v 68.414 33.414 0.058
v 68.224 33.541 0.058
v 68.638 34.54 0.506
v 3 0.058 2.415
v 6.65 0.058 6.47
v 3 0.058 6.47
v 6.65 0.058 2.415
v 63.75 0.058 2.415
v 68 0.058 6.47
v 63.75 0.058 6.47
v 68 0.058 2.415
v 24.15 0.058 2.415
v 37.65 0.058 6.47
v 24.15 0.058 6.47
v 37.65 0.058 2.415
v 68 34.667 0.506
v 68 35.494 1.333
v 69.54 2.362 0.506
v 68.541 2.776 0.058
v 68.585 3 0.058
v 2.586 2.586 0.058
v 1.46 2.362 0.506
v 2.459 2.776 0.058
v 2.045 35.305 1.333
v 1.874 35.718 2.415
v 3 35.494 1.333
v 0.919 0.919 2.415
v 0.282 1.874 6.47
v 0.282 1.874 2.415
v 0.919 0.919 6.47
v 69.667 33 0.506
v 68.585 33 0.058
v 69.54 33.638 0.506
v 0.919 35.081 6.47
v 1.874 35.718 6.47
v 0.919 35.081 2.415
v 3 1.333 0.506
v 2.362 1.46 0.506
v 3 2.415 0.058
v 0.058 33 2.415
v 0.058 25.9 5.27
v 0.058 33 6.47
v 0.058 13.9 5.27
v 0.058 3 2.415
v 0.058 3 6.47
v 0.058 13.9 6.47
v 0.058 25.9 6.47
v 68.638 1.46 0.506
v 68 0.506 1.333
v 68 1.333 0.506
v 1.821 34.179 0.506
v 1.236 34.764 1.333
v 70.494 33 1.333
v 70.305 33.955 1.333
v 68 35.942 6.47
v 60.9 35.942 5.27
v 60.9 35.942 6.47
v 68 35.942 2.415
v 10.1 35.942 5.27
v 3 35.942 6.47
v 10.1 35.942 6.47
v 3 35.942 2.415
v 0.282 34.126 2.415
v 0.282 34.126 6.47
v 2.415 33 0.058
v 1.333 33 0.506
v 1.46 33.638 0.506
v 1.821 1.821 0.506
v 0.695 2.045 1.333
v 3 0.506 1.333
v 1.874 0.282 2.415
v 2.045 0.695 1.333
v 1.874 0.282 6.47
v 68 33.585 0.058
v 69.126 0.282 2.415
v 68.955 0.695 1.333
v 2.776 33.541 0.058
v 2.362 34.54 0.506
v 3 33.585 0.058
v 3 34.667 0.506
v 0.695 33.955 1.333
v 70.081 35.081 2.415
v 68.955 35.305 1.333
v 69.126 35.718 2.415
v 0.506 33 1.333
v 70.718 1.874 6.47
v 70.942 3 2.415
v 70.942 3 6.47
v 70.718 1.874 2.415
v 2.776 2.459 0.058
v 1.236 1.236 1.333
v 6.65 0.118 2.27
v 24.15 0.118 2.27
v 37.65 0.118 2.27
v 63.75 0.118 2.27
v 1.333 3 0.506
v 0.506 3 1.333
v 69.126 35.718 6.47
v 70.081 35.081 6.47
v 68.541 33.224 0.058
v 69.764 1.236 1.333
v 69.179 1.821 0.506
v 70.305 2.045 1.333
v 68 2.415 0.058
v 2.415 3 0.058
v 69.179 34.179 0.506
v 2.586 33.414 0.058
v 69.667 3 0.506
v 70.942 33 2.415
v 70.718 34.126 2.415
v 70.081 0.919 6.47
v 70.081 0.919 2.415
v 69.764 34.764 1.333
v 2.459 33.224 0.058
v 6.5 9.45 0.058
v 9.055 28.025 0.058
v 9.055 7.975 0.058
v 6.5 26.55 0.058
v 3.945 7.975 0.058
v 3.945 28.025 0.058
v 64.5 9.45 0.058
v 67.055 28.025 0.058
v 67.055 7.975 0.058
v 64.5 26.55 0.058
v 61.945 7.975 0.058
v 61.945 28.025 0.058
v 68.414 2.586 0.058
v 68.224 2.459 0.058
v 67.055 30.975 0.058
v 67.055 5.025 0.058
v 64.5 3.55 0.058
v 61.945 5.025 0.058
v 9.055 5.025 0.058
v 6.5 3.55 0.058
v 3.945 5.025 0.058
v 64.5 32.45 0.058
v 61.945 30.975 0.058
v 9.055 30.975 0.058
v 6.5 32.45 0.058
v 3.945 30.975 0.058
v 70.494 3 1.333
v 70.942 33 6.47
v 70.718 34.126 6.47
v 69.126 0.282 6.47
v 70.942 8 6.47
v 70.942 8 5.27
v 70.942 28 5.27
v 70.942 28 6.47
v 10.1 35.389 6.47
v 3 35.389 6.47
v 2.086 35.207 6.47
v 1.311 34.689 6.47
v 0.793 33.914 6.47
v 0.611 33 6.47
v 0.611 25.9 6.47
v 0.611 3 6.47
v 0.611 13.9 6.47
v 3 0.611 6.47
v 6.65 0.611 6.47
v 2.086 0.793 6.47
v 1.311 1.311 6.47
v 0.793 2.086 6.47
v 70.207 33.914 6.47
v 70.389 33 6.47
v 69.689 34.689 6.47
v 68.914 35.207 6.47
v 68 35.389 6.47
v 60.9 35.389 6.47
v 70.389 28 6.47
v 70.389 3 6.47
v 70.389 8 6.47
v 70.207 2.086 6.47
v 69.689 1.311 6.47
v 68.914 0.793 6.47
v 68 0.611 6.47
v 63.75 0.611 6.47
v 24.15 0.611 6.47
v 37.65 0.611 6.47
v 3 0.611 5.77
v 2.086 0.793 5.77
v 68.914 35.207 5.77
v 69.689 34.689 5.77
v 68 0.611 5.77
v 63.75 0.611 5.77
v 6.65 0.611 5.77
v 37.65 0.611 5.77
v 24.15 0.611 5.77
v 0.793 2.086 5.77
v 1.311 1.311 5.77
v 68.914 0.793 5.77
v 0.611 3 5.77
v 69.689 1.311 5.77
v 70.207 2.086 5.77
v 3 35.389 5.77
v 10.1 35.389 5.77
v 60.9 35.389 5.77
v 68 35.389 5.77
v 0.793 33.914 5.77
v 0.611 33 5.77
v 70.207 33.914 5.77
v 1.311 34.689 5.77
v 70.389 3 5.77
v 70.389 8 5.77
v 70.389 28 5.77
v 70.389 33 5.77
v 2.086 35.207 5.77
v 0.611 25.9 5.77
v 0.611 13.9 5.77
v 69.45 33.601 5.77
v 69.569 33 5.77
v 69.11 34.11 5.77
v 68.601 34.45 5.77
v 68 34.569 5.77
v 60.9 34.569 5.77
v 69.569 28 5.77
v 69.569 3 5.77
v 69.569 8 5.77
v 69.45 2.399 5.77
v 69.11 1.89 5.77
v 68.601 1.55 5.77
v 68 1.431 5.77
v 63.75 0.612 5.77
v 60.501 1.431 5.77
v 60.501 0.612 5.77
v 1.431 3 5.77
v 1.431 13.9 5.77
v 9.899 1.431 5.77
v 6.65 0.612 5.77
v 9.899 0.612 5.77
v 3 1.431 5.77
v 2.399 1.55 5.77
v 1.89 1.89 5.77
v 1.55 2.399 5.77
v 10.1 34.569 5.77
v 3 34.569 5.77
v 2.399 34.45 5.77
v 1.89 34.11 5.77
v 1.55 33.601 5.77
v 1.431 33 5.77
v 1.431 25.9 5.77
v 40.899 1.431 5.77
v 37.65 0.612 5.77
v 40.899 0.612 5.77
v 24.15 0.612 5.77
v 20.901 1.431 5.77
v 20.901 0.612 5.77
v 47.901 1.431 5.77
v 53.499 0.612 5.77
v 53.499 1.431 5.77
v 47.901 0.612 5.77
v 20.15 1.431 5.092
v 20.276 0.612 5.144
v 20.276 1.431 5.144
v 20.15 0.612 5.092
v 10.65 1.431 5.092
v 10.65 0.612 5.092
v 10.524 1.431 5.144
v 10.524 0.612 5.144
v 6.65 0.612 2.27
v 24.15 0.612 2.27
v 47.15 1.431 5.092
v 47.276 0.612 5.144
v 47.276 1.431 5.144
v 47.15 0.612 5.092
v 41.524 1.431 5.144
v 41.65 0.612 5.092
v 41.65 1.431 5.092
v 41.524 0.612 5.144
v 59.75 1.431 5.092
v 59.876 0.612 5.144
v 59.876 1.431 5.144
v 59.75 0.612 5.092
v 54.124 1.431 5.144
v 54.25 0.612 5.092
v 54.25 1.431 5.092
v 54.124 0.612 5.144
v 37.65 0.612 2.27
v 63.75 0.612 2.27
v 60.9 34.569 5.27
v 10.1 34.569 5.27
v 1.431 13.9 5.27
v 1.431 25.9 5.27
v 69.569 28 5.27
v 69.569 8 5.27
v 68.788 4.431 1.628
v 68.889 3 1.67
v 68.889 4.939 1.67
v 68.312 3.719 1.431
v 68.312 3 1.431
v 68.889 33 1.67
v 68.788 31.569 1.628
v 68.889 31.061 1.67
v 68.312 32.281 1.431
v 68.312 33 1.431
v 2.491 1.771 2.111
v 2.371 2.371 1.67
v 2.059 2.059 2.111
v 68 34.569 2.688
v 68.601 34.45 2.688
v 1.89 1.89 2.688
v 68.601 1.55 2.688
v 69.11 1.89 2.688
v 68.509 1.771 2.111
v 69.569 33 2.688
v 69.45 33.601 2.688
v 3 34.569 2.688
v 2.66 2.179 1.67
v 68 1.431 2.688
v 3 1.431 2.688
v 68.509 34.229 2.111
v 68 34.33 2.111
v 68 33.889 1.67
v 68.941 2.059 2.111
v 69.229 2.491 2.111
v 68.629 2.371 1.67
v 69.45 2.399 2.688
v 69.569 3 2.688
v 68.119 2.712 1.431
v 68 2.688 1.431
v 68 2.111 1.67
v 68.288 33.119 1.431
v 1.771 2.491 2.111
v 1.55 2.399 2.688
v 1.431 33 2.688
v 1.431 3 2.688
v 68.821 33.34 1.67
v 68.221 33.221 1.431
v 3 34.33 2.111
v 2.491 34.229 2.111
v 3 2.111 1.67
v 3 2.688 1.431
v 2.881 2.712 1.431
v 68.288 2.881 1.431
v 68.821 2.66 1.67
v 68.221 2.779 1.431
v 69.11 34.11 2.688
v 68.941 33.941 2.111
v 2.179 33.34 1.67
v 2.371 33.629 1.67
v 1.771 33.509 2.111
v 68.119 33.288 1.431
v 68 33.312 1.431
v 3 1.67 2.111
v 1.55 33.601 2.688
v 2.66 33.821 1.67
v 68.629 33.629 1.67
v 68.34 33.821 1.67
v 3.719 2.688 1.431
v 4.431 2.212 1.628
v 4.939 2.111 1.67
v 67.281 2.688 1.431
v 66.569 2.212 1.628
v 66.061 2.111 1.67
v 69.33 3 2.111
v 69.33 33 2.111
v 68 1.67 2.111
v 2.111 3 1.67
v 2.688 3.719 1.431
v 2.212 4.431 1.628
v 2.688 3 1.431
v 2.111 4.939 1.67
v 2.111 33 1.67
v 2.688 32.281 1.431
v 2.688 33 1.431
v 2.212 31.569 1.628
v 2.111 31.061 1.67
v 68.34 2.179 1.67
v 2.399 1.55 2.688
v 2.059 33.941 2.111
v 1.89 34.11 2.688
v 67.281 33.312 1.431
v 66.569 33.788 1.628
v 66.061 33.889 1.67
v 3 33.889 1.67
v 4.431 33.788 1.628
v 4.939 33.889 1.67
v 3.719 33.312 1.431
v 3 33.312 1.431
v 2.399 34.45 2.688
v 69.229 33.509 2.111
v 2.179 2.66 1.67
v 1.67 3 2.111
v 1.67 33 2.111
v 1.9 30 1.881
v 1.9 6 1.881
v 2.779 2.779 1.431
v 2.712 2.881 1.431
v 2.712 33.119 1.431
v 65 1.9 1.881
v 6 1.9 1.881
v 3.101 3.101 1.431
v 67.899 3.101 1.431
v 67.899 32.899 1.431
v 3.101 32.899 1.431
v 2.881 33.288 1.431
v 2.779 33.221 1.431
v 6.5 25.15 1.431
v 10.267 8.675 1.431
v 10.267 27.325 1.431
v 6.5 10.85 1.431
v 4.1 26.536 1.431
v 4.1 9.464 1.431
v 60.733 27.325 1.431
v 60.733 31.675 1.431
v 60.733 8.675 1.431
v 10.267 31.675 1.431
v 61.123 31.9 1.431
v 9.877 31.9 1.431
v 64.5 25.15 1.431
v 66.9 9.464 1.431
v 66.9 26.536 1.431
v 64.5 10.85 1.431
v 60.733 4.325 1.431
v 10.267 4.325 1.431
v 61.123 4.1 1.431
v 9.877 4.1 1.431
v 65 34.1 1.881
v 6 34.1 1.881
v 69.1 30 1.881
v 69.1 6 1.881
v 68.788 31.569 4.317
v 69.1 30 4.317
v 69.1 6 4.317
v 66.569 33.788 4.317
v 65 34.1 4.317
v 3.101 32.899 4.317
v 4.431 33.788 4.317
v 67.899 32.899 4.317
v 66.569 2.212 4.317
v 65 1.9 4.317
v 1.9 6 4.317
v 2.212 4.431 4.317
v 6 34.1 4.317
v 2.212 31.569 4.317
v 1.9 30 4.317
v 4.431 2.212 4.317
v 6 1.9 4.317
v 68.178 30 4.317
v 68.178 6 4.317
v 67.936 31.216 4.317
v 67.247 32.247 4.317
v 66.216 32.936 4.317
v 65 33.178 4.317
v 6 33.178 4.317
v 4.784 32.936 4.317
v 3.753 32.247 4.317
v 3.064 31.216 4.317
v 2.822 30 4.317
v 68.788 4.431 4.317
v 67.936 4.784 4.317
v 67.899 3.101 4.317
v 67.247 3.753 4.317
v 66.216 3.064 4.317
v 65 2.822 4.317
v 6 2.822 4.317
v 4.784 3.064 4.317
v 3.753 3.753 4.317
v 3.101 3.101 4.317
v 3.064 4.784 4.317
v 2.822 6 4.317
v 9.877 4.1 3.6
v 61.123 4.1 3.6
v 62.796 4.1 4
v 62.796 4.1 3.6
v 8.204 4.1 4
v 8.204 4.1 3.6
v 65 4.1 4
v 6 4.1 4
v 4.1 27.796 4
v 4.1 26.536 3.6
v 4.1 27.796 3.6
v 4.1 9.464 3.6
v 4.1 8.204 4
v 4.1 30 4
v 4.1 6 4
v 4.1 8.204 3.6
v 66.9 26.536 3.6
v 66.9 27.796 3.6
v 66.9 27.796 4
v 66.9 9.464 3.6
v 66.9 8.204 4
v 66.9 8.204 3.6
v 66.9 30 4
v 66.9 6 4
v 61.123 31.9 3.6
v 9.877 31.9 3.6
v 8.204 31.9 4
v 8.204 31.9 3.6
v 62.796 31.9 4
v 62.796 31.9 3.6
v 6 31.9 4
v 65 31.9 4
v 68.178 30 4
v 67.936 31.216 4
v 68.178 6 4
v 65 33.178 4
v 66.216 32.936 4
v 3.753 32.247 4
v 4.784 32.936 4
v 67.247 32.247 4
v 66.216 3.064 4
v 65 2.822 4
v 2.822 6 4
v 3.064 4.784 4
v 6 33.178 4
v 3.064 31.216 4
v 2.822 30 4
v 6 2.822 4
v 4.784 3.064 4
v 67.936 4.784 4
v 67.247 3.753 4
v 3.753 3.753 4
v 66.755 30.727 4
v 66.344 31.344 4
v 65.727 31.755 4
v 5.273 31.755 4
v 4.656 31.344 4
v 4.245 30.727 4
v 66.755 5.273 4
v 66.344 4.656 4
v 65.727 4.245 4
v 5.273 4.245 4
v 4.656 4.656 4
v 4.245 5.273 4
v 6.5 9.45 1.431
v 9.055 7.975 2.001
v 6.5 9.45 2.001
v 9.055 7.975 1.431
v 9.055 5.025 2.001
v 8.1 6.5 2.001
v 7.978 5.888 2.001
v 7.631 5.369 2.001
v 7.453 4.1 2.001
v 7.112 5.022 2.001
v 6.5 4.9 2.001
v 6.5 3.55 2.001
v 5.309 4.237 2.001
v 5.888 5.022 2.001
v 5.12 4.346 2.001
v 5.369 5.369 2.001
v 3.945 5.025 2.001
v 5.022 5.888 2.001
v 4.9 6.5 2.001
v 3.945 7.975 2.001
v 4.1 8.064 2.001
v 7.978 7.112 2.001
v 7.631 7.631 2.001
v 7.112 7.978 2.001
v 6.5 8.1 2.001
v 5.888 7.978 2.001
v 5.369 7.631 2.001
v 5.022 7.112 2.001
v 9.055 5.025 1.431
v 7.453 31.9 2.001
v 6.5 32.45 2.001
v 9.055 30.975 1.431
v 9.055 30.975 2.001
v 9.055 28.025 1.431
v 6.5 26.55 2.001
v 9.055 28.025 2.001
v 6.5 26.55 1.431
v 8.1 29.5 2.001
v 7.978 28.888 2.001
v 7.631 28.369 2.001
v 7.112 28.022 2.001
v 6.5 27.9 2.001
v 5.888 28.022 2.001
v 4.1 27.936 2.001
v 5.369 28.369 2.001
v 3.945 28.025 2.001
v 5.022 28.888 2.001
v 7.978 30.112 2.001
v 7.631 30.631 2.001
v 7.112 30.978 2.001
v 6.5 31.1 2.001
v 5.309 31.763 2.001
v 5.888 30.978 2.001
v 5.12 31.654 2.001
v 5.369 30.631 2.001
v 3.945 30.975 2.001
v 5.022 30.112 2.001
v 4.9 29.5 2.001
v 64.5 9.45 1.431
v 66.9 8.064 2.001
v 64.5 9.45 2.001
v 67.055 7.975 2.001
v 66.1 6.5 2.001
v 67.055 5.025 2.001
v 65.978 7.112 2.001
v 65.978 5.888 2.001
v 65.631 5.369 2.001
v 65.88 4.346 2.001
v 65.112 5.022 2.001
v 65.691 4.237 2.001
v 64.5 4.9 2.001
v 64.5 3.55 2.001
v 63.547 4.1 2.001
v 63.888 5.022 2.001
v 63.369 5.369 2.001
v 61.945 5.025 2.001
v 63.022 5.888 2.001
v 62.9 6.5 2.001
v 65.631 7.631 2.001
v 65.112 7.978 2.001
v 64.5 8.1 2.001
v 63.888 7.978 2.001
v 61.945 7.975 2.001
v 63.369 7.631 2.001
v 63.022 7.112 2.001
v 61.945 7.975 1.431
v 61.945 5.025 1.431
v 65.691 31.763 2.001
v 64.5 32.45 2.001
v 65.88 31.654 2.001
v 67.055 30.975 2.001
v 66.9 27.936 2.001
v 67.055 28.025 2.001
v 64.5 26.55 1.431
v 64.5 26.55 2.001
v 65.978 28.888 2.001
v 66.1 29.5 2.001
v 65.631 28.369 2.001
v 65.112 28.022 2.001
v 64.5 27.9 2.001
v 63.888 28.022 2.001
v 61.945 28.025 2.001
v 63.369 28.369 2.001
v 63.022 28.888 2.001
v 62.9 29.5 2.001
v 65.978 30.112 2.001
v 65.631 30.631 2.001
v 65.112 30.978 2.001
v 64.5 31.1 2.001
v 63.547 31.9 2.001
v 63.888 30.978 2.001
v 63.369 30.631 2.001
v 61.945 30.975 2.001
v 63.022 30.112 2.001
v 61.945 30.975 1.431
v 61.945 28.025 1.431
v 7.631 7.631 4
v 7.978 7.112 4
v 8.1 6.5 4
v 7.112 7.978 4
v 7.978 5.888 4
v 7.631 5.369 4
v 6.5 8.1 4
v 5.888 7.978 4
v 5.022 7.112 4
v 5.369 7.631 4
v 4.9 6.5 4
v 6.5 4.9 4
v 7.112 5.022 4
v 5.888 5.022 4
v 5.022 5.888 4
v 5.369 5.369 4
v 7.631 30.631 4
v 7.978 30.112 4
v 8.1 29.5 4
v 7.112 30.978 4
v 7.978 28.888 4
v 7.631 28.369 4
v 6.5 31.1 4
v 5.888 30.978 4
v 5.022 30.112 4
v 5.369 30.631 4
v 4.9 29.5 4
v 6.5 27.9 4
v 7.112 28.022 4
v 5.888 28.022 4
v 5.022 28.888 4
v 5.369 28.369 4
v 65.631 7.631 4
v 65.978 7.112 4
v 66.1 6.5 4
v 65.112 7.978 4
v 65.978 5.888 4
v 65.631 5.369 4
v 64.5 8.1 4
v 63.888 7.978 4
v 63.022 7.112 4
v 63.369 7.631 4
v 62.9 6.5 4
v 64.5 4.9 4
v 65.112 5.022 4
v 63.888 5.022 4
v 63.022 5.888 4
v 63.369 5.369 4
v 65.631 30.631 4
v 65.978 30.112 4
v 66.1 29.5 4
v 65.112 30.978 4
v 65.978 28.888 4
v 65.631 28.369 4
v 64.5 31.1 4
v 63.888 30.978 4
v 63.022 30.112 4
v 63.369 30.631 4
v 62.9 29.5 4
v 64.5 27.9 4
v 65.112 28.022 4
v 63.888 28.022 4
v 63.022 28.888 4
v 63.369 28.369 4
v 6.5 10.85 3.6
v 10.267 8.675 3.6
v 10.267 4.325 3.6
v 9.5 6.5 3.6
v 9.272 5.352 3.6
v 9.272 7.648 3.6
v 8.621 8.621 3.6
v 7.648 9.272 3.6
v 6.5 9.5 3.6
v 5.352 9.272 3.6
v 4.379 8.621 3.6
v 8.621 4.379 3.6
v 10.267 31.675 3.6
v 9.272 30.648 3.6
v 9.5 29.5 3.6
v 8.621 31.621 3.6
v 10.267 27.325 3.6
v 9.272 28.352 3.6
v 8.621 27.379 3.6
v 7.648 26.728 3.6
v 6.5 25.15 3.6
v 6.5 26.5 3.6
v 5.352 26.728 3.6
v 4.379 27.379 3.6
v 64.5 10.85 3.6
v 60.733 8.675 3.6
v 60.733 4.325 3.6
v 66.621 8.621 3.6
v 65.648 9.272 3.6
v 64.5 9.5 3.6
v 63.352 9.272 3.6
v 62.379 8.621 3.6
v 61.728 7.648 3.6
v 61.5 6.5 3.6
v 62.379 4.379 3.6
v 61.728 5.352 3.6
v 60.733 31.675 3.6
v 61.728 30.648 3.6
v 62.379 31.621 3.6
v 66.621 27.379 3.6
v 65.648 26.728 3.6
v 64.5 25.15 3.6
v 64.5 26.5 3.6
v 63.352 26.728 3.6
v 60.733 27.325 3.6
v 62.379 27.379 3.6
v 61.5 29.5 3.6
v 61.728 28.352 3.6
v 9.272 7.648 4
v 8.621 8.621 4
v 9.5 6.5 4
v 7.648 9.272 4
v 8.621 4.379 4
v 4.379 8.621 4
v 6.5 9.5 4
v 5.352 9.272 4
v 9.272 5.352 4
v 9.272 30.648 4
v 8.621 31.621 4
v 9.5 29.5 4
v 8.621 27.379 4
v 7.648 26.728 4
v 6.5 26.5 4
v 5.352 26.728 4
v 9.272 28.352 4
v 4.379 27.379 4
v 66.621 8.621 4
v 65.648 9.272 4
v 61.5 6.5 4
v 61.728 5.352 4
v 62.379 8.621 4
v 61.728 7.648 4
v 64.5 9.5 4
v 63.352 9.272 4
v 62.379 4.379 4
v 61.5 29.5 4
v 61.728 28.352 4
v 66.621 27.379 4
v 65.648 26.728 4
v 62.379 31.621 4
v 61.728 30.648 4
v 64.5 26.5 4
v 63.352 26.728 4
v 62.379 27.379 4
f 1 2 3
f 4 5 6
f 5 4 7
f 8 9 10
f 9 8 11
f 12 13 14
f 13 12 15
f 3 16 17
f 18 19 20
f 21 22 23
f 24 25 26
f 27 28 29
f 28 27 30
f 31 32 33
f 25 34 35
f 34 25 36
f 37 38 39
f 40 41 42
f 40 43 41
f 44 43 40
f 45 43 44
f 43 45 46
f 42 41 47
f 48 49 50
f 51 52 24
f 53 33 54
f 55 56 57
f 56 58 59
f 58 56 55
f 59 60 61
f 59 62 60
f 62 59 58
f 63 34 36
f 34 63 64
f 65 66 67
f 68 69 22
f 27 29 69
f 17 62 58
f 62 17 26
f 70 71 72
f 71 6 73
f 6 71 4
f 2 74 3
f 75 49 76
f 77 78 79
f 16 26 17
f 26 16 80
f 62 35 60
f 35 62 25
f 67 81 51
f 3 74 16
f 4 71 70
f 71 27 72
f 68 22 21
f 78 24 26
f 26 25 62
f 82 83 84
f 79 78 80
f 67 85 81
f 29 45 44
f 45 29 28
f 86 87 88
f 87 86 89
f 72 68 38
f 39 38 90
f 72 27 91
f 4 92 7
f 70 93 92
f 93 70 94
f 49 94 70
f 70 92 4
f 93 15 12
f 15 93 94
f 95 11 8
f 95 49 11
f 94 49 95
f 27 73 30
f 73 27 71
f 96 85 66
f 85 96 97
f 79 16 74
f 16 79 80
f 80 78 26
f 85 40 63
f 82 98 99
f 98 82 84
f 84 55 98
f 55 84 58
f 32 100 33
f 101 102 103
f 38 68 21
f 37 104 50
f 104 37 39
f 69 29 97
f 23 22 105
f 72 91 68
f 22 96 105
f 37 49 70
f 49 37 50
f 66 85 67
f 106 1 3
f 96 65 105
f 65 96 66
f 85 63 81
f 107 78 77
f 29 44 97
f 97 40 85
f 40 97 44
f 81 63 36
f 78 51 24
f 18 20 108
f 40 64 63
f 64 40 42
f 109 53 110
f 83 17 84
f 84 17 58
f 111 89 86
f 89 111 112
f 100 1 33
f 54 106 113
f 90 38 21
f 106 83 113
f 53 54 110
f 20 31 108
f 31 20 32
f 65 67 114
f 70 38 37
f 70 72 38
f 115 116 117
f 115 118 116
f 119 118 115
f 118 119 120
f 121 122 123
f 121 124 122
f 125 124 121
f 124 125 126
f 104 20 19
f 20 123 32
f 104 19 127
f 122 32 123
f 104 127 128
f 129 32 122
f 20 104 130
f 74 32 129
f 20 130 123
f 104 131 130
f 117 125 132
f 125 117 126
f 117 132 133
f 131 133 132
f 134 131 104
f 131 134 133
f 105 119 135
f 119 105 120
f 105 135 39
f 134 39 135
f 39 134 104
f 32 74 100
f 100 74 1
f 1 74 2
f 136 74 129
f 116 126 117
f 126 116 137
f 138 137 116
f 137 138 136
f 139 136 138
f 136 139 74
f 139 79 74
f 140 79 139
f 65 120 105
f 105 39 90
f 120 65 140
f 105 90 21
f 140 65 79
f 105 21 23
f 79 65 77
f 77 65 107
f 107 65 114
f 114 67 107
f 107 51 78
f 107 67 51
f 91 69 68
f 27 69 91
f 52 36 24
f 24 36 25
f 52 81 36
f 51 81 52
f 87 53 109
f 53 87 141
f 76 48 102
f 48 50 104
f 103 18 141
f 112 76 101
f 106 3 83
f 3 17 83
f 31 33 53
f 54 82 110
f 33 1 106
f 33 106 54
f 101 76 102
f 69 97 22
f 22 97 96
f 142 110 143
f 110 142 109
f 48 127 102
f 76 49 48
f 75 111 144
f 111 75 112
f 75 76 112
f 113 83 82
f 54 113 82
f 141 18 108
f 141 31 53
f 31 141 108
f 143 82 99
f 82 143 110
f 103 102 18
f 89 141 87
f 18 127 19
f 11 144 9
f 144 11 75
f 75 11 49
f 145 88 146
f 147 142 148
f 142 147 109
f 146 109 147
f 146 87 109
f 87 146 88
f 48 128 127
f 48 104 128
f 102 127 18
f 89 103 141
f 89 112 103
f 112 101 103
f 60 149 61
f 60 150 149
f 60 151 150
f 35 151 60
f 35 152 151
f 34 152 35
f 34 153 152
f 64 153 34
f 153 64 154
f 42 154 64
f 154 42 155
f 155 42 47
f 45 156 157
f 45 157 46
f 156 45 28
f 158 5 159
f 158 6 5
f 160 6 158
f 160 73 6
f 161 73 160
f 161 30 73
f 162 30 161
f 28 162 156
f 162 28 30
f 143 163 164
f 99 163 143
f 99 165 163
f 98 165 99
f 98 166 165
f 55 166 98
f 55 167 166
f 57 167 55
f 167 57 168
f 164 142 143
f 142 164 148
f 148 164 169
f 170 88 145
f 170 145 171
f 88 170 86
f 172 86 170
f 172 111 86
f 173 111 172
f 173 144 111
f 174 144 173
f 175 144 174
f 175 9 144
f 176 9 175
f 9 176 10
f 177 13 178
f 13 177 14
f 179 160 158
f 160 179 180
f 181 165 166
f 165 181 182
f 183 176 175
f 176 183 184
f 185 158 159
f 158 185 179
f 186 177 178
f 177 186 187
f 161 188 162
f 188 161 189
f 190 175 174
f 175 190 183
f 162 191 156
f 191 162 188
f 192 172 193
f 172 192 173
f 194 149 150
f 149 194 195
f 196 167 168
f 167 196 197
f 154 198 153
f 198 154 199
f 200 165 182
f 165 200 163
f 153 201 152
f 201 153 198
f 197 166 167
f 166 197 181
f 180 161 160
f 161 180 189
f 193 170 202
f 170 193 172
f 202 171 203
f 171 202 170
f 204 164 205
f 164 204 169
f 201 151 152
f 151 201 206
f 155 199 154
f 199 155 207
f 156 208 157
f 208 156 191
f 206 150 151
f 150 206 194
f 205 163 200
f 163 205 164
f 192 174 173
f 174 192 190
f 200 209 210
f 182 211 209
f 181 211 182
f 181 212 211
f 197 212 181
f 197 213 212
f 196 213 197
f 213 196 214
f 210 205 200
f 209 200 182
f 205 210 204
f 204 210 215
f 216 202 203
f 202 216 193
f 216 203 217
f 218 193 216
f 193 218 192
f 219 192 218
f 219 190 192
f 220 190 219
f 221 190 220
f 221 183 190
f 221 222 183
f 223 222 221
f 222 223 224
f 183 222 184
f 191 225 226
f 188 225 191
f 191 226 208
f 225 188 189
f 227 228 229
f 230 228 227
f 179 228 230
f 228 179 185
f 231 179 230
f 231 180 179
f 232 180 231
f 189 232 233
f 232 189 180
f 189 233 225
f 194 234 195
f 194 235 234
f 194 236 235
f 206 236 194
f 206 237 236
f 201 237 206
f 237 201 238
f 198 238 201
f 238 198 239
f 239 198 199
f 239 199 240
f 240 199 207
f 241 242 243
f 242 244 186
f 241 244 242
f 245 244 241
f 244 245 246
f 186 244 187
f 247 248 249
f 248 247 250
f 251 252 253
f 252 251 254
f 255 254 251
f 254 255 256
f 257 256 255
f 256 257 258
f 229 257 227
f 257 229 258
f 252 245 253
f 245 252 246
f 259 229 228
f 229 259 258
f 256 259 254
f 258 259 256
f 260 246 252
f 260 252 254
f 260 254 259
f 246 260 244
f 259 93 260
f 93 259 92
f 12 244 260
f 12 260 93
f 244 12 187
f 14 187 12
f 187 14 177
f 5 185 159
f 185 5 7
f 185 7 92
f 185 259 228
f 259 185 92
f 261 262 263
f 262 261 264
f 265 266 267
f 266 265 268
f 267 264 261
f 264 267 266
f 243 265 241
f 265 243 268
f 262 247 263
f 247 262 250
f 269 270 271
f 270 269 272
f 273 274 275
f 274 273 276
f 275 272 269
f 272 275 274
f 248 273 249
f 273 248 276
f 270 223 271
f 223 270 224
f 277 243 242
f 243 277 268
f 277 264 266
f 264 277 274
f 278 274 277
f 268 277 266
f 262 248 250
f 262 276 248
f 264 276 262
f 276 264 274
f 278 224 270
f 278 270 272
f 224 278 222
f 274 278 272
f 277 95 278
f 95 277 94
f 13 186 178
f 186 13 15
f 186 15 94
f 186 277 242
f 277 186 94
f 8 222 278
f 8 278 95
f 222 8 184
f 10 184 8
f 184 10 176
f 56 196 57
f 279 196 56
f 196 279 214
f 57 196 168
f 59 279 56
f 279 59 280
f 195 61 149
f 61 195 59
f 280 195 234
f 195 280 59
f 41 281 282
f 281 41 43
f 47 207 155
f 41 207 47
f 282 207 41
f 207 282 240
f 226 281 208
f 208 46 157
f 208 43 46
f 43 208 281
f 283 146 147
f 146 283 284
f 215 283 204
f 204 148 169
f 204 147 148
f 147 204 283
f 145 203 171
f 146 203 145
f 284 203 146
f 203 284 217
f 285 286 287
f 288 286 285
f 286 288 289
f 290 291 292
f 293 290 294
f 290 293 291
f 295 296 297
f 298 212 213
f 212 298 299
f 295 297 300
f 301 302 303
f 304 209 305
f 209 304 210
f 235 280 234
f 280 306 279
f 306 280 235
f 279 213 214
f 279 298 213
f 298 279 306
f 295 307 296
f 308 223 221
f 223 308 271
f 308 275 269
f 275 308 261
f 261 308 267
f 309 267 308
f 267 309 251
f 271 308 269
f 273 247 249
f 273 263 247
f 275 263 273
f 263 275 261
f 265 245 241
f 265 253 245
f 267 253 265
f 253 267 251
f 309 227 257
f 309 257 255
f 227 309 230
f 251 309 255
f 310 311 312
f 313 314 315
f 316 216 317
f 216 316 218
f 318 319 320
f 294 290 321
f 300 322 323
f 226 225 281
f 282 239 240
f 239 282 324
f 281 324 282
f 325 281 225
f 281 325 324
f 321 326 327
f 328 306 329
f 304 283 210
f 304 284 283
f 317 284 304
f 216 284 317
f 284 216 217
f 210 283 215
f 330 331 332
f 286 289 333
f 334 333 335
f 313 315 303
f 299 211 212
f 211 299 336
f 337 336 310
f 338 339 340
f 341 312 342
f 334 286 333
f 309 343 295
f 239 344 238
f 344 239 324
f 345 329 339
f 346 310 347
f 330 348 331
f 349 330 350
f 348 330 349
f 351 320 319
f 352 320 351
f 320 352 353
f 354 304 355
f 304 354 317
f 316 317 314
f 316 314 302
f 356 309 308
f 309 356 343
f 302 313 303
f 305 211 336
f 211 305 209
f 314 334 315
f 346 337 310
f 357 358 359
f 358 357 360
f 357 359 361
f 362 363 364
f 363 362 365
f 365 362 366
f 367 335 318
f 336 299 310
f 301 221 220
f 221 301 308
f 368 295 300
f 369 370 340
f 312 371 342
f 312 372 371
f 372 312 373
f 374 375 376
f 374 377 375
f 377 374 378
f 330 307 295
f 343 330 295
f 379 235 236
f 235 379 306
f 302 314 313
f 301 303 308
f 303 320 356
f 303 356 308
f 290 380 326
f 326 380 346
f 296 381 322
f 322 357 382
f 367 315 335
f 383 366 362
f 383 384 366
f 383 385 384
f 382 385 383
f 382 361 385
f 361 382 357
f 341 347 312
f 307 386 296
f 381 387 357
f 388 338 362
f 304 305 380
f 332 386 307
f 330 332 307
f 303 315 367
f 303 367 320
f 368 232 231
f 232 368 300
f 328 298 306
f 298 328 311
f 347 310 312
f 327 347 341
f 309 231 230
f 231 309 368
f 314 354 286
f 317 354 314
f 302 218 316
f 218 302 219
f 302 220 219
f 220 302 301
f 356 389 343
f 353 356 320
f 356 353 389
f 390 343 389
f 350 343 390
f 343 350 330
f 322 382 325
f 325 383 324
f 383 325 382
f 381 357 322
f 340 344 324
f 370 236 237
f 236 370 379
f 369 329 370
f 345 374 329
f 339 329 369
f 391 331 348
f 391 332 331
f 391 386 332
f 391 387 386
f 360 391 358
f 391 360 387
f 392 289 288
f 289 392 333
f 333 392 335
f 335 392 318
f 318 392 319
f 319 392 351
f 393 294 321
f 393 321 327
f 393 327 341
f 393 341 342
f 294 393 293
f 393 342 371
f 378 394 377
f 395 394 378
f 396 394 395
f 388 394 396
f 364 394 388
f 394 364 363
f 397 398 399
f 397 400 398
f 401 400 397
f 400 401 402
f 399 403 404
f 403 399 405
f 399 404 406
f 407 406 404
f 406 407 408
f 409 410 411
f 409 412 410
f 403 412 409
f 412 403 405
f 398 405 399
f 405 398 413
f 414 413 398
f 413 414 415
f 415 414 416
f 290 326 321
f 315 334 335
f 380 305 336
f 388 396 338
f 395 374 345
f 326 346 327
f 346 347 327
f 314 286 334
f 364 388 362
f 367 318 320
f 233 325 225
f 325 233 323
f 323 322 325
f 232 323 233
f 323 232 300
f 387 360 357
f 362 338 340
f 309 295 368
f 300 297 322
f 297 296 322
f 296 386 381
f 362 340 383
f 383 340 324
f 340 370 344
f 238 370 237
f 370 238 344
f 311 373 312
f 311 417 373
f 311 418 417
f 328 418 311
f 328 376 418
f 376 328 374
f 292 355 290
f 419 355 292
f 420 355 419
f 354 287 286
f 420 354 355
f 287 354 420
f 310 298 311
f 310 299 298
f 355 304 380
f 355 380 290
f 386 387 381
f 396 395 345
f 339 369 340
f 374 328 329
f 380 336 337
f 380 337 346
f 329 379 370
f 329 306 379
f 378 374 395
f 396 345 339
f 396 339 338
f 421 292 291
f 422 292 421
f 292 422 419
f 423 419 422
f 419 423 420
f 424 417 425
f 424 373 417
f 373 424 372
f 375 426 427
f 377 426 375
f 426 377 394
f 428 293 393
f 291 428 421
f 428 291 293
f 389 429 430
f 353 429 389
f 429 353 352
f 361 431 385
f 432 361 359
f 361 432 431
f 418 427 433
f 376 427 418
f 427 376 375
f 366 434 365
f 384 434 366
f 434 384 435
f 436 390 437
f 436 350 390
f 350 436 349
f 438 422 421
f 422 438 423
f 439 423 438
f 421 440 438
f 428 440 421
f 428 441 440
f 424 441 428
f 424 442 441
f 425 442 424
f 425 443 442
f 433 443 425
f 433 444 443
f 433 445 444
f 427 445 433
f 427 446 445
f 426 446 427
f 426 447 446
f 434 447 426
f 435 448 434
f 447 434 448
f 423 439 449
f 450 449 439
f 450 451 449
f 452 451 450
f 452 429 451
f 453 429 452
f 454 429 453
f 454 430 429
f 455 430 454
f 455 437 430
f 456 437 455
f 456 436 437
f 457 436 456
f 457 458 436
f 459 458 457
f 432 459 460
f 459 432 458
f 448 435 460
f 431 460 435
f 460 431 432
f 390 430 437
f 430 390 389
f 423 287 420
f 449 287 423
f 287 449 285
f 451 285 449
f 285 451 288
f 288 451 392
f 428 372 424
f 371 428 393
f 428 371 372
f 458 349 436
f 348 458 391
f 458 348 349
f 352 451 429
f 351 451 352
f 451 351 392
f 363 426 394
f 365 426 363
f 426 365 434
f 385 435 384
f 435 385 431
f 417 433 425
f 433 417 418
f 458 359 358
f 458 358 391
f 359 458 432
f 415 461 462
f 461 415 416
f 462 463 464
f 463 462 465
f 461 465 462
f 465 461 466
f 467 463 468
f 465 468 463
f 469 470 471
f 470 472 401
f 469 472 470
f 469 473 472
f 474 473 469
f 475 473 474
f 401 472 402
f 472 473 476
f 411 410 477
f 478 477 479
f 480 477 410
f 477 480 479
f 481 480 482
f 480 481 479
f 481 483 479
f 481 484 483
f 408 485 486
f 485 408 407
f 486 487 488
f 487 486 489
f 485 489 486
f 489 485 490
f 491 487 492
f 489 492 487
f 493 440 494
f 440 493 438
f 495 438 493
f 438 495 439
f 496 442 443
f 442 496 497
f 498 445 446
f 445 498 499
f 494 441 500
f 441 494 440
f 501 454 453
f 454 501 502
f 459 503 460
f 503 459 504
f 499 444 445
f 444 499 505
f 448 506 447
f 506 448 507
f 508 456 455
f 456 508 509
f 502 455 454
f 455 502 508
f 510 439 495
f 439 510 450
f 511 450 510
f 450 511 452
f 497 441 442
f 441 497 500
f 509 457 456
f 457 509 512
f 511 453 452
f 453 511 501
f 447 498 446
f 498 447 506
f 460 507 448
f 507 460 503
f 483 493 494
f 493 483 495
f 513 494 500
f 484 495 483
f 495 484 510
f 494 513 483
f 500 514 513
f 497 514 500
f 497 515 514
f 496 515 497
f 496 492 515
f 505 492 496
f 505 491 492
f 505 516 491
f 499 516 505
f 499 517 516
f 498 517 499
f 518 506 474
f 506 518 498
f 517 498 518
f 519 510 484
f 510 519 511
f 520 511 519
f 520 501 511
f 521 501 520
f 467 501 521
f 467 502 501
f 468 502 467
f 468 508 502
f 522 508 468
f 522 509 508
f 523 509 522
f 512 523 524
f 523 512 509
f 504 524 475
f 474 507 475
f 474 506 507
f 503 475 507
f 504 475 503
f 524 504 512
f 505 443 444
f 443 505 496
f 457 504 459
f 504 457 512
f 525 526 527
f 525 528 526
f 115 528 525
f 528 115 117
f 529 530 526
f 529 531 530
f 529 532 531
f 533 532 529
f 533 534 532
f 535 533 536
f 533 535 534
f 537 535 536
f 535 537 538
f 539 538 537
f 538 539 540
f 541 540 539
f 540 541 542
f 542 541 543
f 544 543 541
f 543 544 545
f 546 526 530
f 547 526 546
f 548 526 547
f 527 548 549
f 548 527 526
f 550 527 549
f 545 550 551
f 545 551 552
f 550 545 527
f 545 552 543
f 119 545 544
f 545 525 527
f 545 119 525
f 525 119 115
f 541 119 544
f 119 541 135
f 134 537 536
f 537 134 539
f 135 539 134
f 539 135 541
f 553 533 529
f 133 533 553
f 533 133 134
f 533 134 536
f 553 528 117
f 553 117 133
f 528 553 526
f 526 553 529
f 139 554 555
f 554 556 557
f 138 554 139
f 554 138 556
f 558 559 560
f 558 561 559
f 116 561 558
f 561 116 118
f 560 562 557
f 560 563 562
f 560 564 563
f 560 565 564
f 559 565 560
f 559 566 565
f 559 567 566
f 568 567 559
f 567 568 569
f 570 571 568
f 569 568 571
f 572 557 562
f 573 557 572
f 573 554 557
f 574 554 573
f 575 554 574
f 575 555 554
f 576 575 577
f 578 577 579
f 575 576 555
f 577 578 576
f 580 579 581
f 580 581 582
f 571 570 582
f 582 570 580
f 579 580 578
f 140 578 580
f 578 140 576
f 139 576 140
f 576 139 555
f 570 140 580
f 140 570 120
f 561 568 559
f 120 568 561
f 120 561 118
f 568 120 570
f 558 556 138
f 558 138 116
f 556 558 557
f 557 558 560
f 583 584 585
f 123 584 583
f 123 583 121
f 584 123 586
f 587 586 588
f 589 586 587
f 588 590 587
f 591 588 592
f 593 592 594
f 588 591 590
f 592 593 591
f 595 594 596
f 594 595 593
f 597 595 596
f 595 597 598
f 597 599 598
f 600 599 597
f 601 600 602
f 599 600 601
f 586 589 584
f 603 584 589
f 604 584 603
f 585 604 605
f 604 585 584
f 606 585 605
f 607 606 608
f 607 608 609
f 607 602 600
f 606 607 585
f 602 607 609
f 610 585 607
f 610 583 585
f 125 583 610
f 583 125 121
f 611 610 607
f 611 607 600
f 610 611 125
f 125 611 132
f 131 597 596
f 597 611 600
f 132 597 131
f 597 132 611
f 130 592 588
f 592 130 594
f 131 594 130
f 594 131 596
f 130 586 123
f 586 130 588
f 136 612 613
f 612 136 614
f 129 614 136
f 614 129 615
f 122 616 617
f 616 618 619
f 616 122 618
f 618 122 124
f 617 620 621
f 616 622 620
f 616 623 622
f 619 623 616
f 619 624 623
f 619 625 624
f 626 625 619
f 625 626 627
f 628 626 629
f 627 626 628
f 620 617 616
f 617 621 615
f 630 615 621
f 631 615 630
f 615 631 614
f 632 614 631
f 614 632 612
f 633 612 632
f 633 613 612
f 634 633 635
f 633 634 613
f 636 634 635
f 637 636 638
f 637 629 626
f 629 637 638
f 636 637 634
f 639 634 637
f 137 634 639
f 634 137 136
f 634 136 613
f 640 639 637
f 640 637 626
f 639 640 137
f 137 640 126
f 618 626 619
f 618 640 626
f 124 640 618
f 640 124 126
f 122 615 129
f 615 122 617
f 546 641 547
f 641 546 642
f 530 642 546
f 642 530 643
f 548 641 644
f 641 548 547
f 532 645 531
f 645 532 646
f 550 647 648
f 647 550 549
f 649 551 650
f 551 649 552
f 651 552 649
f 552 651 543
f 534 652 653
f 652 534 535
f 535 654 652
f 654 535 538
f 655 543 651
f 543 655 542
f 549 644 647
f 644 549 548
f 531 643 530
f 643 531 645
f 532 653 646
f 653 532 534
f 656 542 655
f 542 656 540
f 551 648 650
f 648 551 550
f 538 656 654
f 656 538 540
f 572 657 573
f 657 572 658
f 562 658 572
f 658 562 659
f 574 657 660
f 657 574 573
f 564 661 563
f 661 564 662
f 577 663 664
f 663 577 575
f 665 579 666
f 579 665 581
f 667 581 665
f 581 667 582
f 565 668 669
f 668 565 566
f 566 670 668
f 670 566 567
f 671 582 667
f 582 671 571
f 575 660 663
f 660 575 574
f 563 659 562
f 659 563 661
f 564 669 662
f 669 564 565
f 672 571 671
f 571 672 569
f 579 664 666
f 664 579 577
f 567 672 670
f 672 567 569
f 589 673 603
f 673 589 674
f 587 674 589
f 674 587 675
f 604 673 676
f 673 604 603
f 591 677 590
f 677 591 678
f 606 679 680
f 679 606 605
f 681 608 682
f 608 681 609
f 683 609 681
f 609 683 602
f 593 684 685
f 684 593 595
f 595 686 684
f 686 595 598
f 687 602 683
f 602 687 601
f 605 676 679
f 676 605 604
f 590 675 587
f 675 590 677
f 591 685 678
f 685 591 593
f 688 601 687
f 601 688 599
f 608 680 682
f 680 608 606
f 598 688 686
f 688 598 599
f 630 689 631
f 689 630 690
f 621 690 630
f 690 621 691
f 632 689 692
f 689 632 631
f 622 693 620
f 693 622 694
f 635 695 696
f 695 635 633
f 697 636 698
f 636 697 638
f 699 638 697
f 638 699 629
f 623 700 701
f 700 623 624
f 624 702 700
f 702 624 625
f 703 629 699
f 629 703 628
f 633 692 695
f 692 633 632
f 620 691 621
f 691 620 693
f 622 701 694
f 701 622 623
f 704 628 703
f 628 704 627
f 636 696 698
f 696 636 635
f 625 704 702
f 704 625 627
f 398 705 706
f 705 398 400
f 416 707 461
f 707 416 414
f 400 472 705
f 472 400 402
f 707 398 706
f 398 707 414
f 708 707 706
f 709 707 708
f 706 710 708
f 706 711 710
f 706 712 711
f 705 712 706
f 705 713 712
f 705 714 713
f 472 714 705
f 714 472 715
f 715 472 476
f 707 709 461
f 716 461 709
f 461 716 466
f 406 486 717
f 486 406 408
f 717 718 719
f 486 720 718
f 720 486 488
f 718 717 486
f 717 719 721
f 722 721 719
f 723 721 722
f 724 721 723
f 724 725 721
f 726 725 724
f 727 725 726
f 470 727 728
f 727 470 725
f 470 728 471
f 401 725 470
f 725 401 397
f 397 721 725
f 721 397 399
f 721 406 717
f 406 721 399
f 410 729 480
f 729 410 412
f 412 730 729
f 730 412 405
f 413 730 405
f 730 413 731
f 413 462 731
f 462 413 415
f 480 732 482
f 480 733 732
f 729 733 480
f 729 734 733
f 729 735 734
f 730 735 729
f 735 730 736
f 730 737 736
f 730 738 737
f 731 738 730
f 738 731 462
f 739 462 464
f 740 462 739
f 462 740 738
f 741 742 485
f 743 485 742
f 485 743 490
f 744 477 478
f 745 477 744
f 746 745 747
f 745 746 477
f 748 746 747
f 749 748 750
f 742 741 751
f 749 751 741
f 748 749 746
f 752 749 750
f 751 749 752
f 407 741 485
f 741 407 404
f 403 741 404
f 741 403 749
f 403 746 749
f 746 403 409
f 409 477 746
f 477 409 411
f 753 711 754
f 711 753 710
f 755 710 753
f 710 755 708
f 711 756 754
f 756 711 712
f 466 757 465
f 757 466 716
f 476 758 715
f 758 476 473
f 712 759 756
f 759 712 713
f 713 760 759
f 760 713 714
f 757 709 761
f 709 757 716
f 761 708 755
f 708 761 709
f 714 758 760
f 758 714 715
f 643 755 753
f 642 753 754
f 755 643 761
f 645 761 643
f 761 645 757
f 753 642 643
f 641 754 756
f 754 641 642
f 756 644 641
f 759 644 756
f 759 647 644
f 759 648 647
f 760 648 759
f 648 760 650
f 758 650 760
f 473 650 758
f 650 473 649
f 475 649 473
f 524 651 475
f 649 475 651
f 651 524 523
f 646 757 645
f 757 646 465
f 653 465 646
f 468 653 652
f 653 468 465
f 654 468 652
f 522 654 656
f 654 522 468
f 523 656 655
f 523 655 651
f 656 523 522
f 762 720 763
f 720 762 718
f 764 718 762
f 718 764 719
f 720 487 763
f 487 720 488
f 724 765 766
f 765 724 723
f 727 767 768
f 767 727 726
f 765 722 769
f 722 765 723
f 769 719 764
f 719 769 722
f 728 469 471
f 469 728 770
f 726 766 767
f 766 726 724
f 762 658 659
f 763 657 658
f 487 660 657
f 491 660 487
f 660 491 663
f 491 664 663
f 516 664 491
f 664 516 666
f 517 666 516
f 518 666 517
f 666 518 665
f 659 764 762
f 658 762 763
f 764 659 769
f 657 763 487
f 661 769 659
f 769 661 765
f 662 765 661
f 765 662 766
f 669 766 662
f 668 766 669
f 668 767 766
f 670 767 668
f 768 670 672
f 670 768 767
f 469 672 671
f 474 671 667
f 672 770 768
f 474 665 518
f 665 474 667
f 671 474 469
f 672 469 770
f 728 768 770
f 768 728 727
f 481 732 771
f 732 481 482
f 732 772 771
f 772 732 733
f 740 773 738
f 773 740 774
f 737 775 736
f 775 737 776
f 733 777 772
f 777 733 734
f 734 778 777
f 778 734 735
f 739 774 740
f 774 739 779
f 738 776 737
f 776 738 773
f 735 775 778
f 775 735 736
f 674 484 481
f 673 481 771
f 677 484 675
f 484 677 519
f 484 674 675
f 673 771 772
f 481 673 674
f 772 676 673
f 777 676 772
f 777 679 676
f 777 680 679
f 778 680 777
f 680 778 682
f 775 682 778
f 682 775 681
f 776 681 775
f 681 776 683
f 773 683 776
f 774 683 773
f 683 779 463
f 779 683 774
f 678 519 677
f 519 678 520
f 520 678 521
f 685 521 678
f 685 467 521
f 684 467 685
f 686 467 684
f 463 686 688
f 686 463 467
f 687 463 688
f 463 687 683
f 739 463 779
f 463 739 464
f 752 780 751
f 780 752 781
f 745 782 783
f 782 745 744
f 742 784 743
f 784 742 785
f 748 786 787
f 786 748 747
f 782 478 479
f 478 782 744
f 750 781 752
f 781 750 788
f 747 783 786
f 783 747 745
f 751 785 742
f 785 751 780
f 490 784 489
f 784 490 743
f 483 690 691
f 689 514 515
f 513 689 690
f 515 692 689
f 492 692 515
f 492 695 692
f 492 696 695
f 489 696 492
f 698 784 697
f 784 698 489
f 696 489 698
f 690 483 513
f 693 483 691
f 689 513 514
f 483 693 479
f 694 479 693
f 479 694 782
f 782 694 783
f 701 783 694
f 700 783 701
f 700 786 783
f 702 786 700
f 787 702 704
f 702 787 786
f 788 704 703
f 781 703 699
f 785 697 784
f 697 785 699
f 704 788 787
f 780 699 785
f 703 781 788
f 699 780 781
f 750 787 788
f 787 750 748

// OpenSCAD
inch=25.4;

boards=1;
standoff=0;

color=1;
spacing=1;

kerf=0.007*inch;

make_stl=0;

show_branding=0;

bevel=3;

corners=3;

low_fineness=16;
low_font_fineness=1;
low_disk_fineness=48;
stl_fineness=80;
stl_font_fineness=40;
stl_disk_fineness=320;

fineness=make_stl?stl_fineness:low_fineness;

font_fineness=make_stl?stl_font_fineness:low_font_fineness;

disk_fineness=make_stl?stl_disk_fineness:low_disk_fineness;

screw_length=10;
screw_head=2.2;

thickness=screw_length+screw_head;


shell_thickness=1.4;
nut_kerf=2.2;

board_bevel=3;
board_zpos=4;
board_thickness=1/20*inch;
support_thickness=2.2;
io_support_thickness=bevel-(shell_thickness-kerf)/2;

shell_connector=shell_thickness/2;
shell_split=board_zpos+board_thickness+0.5;

cladding_offset=3;
cladding_override=1;

if (make_stl){
    fineness=stl_fineness;
    font_fineness=stl_font_fineness;
}

module PiZero(){
    difference(){
        minkowski(){
            cylinder(board_thickness/2,board_bevel,board_bevel,$fn=fineness);
            translate([bevel+board_bevel,bevel+board_bevel,board_zpos])
                cube(size=[65-board_bevel*2,30-board_bevel*2,board_thickness/2]);
        }
        translate([bevel,bevel,0])
        ScrewHoles();
    }
}

module PiZeroKerf(){
    minkowski(){
        cylinder(board_thickness/2+kerf*2,board_bevel+kerf,board_bevel+kerf,$fn=fineness);
        translate([bevel+board_bevel,bevel+board_bevel,board_zpos])
            cube(size=[65-board_bevel*2,30-board_bevel*2,board_thickness/2]);
    }
}

// Screws

module ScrewHoles(){
    translate([3.5,3.5,0])
    Screw();
    
    translate([3.5,26.5,0])
    Screw();
    
    translate([61.5,3.5,0])
    Screw();
    
    translate([61.5,26.5,0])
    Screw();
}

module Screw(){
    translate([0,0,-0.002])
    cylinder(thickness+0.004,1.6,1.6,$fn=fineness);
}



// IO Cutouts

module GPIOCutout(){
    translate([bevel+32.5-(20*inch/10)/2,30+bevel,board_zpos+board_thickness])
    cube(size=[20*inch/10,bevel+1,2+0.001]);
}

module CameraIOCutout(){
    translate([65+bevel-65/2,bevel+(30-20)/2,board_zpos+board_thickness])
    cube(size=[bevel+1+65/2,20,1.5]);
}

module MicroSDCutout(){
    translate([bevel+14,12/2+bevel+16.9,board_zpos+board_thickness])
    rotate([0,0,180])
    cube([bevel+1+14,12,2.5]);
}

module MicroSDShellCutout(){
    h=thickness-(board_zpos+board_thickness)-2.5;
    
    translate([-22.5+bevel+1,16.9+bevel,board_zpos+board_thickness+2.5])
    translate([0,0,-0.001])
    intersection(){
        cylinder(h,22.5+shell_thickness,22.5+shell_thickness,$fn=disk_fineness);
            translate([22.5-((bevel+1+shell_thickness)/2)+shell_thickness,0,h/2])
            cube(size=[bevel+shell_thickness+1,12+shell_thickness*2,h],center=true);
    }
}

module MicroSDNailCutout(){
    h=thickness-(board_zpos+board_thickness);
    
    translate([-22.5+bevel+1,16.9+bevel,board_zpos+board_thickness])
    translate([0,0,-0.002])
    intersection(){
        cylinder(h+0.002,22.5,22.5,$fn=disk_fineness);
            translate([22.5-((bevel+1)/2)-0.001,0,h/2])
            cube(size=[bevel+1+0.001,12,h+0.004],center=true);
    }
}

module MicroSDTab(){
    
    translate([-22.5+bevel+1,16.9+bevel,board_zpos+board_thickness])
    
        translate([0,0,2.5])
        intersection(){
            cylinder(shell_thickness,22.5+shell_thickness,22.5+shell_thickness,$fn=disk_fineness);
            translate([22.5-((bevel+1+shell_thickness)/2)+shell_thickness,0,shell_thickness/2-0.001])
            cube(size=[bevel+shell_thickness+1,12+shell_thickness*2,shell_thickness+0.002],center=true);
        }
}

module HDMIPoly(){
    polygon([[1,0],[0,1],[0,3.5],[11.5,3.5],[11.5,1],[10.5,0]]);
}


module HDMICladdingPoly(){
    polygon([[0,0],[0,3.5],[11.5,3.5],[11.5,0]]);
}

module USBMicroPoly(){
    polygon([[1,0],[0,1],[0,3.0],[7.5,3.0],[7.5,1],[6.5,0]]);
}

module USBMicroCladdingPoly(){
    polygon([[0,0],[0,3.0],[7.5,3.0],[7.5,0]]);
}

module HDMIMiniCutout(){
    translate([bevel+12.4-(11.5/2),bevel,board_zpos+board_thickness])
    rotate([90,0,0])
 linear_extrude(bevel+1,convexity=10)
    offset(r=kerf)
    HDMIPoly();
}

module USBMicroCutout(){
      translate([bevel+41.4-(7.5/2),bevel,board_zpos+board_thickness])
    rotate([90,0,0])
    linear_extrude(bevel+1,convexity=10)
    offset(r=kerf)
    USBMicroPoly();
}

module USBMicroCutoutB(){
      translate([bevel+54-(7.5/2),bevel,board_zpos+board_thickness])
    rotate([90,0,0])
    linear_extrude(bevel+1,convexity=10)
    offset(r=kerf)
    USBMicroPoly();
}

module HDMIMiniCladdingCutout(){
    translate([bevel+12.4,bevel-io_support_thickness+0.001,board_zpos+board_thickness-cladding_offset])
    rotate([90,0,0])
    linear_extrude(bevel+1,convexity=10)
    offset(delta=cladding_offset)
    translate([-11.5/2,3,0])
    HDMICladdingPoly();
}

module USBMicroCladdingCutoutA(){
    translate([bevel+41.4,bevel-io_support_thickness+0.001,board_zpos+board_thickness-cladding_offset])
    rotate([90,0,0])
    linear_extrude(bevel+1,convexity=10)
    offset(delta=cladding_offset)
    translate([-7.5/2,3,0])
    USBMicroCladdingPoly();
}

module USBMicroCladdingCutoutB(){
    translate([bevel+54,bevel-io_support_thickness+0.001,board_zpos+board_thickness-cladding_offset])
    rotate([90,0,0])
    linear_extrude(bevel+1,convexity=10)
    offset(delta=cladding_offset)
    translate([-7.5/2,3,0])
    USBMicroCladdingPoly();
}



// Screw Cutouts


module ScrewHead(){
    
    // Top Mounts
    translate([0,0,0.001])
    cylinder(nut_kerf+0.002,5.9/2,5.9/2,$fn=fineness);
}

module ScrewHeads(){
    
    // Bottom Screw Stands
    translate([3.5,3.5,thickness-nut_kerf])
    ScrewHead();
    
    translate([3.5,26.5,thickness-nut_kerf])
    ScrewHead();
    
    translate([61.5,3.5,thickness-nut_kerf])
    ScrewHead();
    
    translate([61.5,26.5,thickness-nut_kerf])
    ScrewHead();
}

module ScrewHeadStand(){
    
    translate([0,0,0])
    cylinder(nut_kerf+0.001,5.9/2+shell_thickness,5.9/2+shell_thickness,$fn=fineness);
}

module ScrewHeadStands(){
    translate([3.5,3.5,thickness-nut_kerf-shell_thickness])
    ScrewHeadStand();
    
    translate([3.5,26.5,thickness-nut_kerf-shell_thickness])
    ScrewHeadStand();
    
    translate([61.5,3.5,thickness-nut_kerf-shell_thickness])
    ScrewHeadStand();
    
    translate([61.5,26.5,thickness-nut_kerf-shell_thickness])
    ScrewHeadStand();
}

module TopScrewStand(){
    translate([0,0,board_zpos+board_thickness+kerf*2])
    cylinder(thickness-board_zpos-nut_kerf-shell_thickness-board_thickness-kerf,1.6+shell_thickness,1.6+shell_thickness,$fn=fineness);
}

module TopScrewStands(){
    translate([3.5,3.5,0])
    TopScrewStand();
    
    translate([3.5,26.5,0])
    TopScrewStand();
    
    translate([61.5,3.5,0])
    TopScrewStand();
    
    translate([61.5,26.5,0])
    TopScrewStand();
}

    // Bottom Mounts
    
    
function ngon(count, radius, i = 0, result = []) = i < count
    ? ngon(count, radius, i + 1, concat(result, [[ radius*sin(360/count*i), radius*cos(360/count*i) ]]))
    : result;

module HexHole(){
    translate([0,0,-0.001])
    linear_extrude(2+0.002,convexity=10)
    polygon(ngon(6,5.9/2));

//cylinder(2,1.6,1.6,$fn=fineness);    
}

module Hexes(){
    translate([3.5,3.5,0])
    HexHole();
    
    translate([3.5,26.5,0])
    HexHole();
    
    translate([61.5,3.5,0])
    HexHole();
    
    translate([61.5,26.5,0])
    HexHole();
    
}

module HexStands(){
    translate([3.5,3.5,0])
    HexStand();
    
    translate([3.5,26.5,0])
    HexStand();
    
    translate([61.5,3.5,0])
    HexStand();
    
    translate([61.5,26.5,0])
    HexStand();
    
}

module HexStand(){
    translate([0,0,shell_thickness])
    linear_extrude(nut_kerf,convexity=10)
    polygon(ngon(6,5.9/2+shell_thickness));
}


module BottomScrewStand(){
    stand_height=(1)?19:5;
    
    stand_height=(nut_kerf+shell_thickness*2 < board_zpos)?board_zpos-nut_kerf-shell_thickness:(board_zpos-nut_kerf-shell_thickness);

    translate([0,0,-0.001])
    cylinder(stand_height+0.001,1.6+shell_thickness,1.6+shell_thickness,$fn=fineness);
}

module BottomScrewStands(){
    
    translate([3.5,3.5,0])
    BottomScrewStand();
    
    translate([3.5,26.5,0])
    BottomScrewStand();
    
    translate([61.5,3.5,0])
    BottomScrewStand();
    
    translate([61.5,26.5,0])
    BottomScrewStand();
}

module BottomStands(){
    translate([bevel,bevel,0])
    difference(){
        HexStands();
            Hexes();
            ScrewHoles();
    }

    translate([bevel,bevel,nut_kerf+shell_thickness])
    difference(){
        BottomScrewStands();
        ScrewHoles();
    }
}

    // Shell Halves

module PocketPiTop(){
    union(){
        difference(){
            TopShell();
            translate([bevel,bevel,0])
            ScrewHeads();
        
            translate([65+bevel*2,0,thickness])
            rotate([0,180,0])
            Branding();
        }
        translate([bevel,bevel,0])
        difference(){
            ScrewHeadStands();
            translate([-bevel,-bevel,0])
            CameraIOCutout();
            ScrewHeads();
            ScrewHoles();
        }
        translate([bevel,bevel,0])
        difference(){
            TopScrewStands();
            translate([-bevel,-bevel,0])
            CameraIOCutout();
            ScrewHoles();
        }
    }
}

module PocketPiBottom(){
    difference(){
        union(){
            BottomShell();
            BoardSupport();
        }
        translate([bevel,bevel,0]){
            Hexes();
            ScrewHoles();
        }
    }



    BottomStands();
}



// PocketPi Shell


module Shell(){
 minkowski(){
  sphere(bevel,$fn=fineness);
  translate([bevel,bevel,bevel])     
    cube(size=[65,30,thickness-bevel*2]);
 }   
}

module ShellConnectorCutout(){
    translate([bevel,bevel,shell_split])
    minkowski(){
        cylinder(shell_connector/2+0.001,bevel-shell_thickness/2+kerf/2,bevel-shell_thickness/2+kerf/2,$fn=fineness);
        cube(size=[65,30,shell_connector/2+0.001]);
    }
}

module ShellConnectorCutoutB(){
    translate([bevel,bevel,shell_split])
   
    difference(){
         
        translate([0,0,-0.001])
        minkowski(){
            cylinder(shell_connector/2+0.001,bevel+0.001,bevel+0.001,$fn=fineness);
            cube(size=[65,30,shell_connector/2]);
        }
        translate([0,0,-0.001]);
        minkowski(){
            cylinder(shell_connector/2+0.002,bevel-shell_thickness/2-kerf/2,bevel-shell_thickness/2-kerf/2,$fn=fineness);
            translate([0,0,-0.001])
            cube(size=[65,30,shell_connector/2+0.002]);
        }
    }
}

module BottomSlice(){
 difference(){
     Shell();
     translate([-0.001,-0.001,shell_split+shell_connector])
     cube([65+bevel*2+0.002,30+bevel*2+0.002,thickness-shell_split+0.001]);
     ShellConnectorCutout();
 }
}

module TopSlice(){
 difference(){
     Shell();
     translate([-0.001,-0.001,-0.001])
     cube([65+bevel*2+0.002,30+bevel*2+0.002,shell_split+0.001]);
     ShellConnectorCutoutB();
 }
}

module Inset(){
 minkowski(){
  sphere(bevel-shell_thickness,$fn=fineness);
     translate([bevel,bevel,bevel])
     cube(size=[65,30,thickness-bevel*2]);
 }    
}


module Cutouts(){
    HDMIMiniCutout();
    HDMIMiniCladdingCutout();
    USBMicroCutout();
    USBMicroCutoutB();
    USBMicroCladdingCutoutA();
    USBMicroCladdingCutoutB();
    GPIOCutout();
    MicroSDCutout();
    CameraIOCutout();
}

module BottomShell(){
    difference(){
        BottomSlice();
        Inset();
        
        Cutouts();
        
        Branding();
    }
}

module TopShell(){
    union(){
        difference(){
            TopSlice();
            Inset();
            MicroSDShellCutout();
            Cutouts();
        }
        difference(){
            intersection(){
                TopSlice();
                MicroSDShellCutout();
            }
            MicroSDNailCutout();
            MicroSDCutout();
        }
        difference(){
            translate([3,0,0])
        MicroSDTab();
            MicroSDNailCutout();
        }
    }
}

module BoardSupport(){
    
    difference(){
        minkowski(){
            
            cylinder((board_zpos-shell_thickness+board_thickness/2)/2,board_bevel+support_thickness/2,board_bevel+support_thickness/2,$fn=fineness);
             translate([bevel+board_bevel,bevel+board_bevel,shell_thickness])
             cube(size=[65-board_bevel*2,30-board_bevel*2,(board_zpos-shell_thickness)/2]);
        }

        minkowski(){
            cylinder((board_zpos-shell_thickness+board_thickness/2)/2,board_bevel-support_thickness/2,board_bevel-support_thickness/2,$fn=fineness);
             translate([bevel+board_bevel,bevel+board_bevel,shell_thickness-0.001])
             cube(size=[65-board_bevel*2,30-board_bevel*2,(board_zpos-shell_thickness)/2+0.002]);
        }
        
        PiZeroKerf();

    }
}

module Branding(){
    if (show_branding){
    translate([32.5+bevel,25+bevel])
    linear_extrude(0.4,convexity=10)
    rotate([0,180,0])
    text("BalinTech", font="Liberation Sans:style=Bold",size=7,halign="center",valign="center",$fn=font_fineness);
    
    translate([32.5+bevel,15+bevel])
    linear_extrude(0.4,convexity=10)
    rotate([0,180,0])
    text("PocketPi", font="Liberation Sans:style=Bold",size=11,halign="center",valign="center",$fn=font_fineness);
    
    translate([32.5+bevel,5+bevel])
    linear_extrude(0.4,convexity=10)
    rotate([0,180,0])
    text("OpenSCAD Edition", font="Liberation Sans:style=Bold",size=4,halign="center",valign="center",$fn=font_fineness);
    }
}



// Render View(s)



//PiZero();

//Shell();


module Render(){
    //color([0.5,0.5,0.5,0.7])
    n=5;
    x=5;


    if (spacing){
        translate([0,0,2*x+n])
        PocketPiTop();
    }else{
        PocketPiTop();
    }

    if (spacing){
        translate([0,0,x+n])
        PiZero();
    }else{
        PiZero();
    }

    PocketPiBottom();
}


module PrintTop(){
    translate([0,30/2+bevel,0])
    rotate([180,0,0])
    translate([0,-30/2-bevel,-thickness])
    PocketPiTop();
}

module PrintBottom(){
    PocketPiBottom();
}

module PrintBoth(){
PrintTop();
    translate([0,30+bevel*2+3,0])
    PrintBottom();
}



//union()
//
//Render();
//PrintBoth();
union(){
    PrintBottom();
    //PrintTop();
}
//color([1,1,0,0.4])
//PocketPiTop();
//PocketPiBottom();
//CameraIOCutout();
